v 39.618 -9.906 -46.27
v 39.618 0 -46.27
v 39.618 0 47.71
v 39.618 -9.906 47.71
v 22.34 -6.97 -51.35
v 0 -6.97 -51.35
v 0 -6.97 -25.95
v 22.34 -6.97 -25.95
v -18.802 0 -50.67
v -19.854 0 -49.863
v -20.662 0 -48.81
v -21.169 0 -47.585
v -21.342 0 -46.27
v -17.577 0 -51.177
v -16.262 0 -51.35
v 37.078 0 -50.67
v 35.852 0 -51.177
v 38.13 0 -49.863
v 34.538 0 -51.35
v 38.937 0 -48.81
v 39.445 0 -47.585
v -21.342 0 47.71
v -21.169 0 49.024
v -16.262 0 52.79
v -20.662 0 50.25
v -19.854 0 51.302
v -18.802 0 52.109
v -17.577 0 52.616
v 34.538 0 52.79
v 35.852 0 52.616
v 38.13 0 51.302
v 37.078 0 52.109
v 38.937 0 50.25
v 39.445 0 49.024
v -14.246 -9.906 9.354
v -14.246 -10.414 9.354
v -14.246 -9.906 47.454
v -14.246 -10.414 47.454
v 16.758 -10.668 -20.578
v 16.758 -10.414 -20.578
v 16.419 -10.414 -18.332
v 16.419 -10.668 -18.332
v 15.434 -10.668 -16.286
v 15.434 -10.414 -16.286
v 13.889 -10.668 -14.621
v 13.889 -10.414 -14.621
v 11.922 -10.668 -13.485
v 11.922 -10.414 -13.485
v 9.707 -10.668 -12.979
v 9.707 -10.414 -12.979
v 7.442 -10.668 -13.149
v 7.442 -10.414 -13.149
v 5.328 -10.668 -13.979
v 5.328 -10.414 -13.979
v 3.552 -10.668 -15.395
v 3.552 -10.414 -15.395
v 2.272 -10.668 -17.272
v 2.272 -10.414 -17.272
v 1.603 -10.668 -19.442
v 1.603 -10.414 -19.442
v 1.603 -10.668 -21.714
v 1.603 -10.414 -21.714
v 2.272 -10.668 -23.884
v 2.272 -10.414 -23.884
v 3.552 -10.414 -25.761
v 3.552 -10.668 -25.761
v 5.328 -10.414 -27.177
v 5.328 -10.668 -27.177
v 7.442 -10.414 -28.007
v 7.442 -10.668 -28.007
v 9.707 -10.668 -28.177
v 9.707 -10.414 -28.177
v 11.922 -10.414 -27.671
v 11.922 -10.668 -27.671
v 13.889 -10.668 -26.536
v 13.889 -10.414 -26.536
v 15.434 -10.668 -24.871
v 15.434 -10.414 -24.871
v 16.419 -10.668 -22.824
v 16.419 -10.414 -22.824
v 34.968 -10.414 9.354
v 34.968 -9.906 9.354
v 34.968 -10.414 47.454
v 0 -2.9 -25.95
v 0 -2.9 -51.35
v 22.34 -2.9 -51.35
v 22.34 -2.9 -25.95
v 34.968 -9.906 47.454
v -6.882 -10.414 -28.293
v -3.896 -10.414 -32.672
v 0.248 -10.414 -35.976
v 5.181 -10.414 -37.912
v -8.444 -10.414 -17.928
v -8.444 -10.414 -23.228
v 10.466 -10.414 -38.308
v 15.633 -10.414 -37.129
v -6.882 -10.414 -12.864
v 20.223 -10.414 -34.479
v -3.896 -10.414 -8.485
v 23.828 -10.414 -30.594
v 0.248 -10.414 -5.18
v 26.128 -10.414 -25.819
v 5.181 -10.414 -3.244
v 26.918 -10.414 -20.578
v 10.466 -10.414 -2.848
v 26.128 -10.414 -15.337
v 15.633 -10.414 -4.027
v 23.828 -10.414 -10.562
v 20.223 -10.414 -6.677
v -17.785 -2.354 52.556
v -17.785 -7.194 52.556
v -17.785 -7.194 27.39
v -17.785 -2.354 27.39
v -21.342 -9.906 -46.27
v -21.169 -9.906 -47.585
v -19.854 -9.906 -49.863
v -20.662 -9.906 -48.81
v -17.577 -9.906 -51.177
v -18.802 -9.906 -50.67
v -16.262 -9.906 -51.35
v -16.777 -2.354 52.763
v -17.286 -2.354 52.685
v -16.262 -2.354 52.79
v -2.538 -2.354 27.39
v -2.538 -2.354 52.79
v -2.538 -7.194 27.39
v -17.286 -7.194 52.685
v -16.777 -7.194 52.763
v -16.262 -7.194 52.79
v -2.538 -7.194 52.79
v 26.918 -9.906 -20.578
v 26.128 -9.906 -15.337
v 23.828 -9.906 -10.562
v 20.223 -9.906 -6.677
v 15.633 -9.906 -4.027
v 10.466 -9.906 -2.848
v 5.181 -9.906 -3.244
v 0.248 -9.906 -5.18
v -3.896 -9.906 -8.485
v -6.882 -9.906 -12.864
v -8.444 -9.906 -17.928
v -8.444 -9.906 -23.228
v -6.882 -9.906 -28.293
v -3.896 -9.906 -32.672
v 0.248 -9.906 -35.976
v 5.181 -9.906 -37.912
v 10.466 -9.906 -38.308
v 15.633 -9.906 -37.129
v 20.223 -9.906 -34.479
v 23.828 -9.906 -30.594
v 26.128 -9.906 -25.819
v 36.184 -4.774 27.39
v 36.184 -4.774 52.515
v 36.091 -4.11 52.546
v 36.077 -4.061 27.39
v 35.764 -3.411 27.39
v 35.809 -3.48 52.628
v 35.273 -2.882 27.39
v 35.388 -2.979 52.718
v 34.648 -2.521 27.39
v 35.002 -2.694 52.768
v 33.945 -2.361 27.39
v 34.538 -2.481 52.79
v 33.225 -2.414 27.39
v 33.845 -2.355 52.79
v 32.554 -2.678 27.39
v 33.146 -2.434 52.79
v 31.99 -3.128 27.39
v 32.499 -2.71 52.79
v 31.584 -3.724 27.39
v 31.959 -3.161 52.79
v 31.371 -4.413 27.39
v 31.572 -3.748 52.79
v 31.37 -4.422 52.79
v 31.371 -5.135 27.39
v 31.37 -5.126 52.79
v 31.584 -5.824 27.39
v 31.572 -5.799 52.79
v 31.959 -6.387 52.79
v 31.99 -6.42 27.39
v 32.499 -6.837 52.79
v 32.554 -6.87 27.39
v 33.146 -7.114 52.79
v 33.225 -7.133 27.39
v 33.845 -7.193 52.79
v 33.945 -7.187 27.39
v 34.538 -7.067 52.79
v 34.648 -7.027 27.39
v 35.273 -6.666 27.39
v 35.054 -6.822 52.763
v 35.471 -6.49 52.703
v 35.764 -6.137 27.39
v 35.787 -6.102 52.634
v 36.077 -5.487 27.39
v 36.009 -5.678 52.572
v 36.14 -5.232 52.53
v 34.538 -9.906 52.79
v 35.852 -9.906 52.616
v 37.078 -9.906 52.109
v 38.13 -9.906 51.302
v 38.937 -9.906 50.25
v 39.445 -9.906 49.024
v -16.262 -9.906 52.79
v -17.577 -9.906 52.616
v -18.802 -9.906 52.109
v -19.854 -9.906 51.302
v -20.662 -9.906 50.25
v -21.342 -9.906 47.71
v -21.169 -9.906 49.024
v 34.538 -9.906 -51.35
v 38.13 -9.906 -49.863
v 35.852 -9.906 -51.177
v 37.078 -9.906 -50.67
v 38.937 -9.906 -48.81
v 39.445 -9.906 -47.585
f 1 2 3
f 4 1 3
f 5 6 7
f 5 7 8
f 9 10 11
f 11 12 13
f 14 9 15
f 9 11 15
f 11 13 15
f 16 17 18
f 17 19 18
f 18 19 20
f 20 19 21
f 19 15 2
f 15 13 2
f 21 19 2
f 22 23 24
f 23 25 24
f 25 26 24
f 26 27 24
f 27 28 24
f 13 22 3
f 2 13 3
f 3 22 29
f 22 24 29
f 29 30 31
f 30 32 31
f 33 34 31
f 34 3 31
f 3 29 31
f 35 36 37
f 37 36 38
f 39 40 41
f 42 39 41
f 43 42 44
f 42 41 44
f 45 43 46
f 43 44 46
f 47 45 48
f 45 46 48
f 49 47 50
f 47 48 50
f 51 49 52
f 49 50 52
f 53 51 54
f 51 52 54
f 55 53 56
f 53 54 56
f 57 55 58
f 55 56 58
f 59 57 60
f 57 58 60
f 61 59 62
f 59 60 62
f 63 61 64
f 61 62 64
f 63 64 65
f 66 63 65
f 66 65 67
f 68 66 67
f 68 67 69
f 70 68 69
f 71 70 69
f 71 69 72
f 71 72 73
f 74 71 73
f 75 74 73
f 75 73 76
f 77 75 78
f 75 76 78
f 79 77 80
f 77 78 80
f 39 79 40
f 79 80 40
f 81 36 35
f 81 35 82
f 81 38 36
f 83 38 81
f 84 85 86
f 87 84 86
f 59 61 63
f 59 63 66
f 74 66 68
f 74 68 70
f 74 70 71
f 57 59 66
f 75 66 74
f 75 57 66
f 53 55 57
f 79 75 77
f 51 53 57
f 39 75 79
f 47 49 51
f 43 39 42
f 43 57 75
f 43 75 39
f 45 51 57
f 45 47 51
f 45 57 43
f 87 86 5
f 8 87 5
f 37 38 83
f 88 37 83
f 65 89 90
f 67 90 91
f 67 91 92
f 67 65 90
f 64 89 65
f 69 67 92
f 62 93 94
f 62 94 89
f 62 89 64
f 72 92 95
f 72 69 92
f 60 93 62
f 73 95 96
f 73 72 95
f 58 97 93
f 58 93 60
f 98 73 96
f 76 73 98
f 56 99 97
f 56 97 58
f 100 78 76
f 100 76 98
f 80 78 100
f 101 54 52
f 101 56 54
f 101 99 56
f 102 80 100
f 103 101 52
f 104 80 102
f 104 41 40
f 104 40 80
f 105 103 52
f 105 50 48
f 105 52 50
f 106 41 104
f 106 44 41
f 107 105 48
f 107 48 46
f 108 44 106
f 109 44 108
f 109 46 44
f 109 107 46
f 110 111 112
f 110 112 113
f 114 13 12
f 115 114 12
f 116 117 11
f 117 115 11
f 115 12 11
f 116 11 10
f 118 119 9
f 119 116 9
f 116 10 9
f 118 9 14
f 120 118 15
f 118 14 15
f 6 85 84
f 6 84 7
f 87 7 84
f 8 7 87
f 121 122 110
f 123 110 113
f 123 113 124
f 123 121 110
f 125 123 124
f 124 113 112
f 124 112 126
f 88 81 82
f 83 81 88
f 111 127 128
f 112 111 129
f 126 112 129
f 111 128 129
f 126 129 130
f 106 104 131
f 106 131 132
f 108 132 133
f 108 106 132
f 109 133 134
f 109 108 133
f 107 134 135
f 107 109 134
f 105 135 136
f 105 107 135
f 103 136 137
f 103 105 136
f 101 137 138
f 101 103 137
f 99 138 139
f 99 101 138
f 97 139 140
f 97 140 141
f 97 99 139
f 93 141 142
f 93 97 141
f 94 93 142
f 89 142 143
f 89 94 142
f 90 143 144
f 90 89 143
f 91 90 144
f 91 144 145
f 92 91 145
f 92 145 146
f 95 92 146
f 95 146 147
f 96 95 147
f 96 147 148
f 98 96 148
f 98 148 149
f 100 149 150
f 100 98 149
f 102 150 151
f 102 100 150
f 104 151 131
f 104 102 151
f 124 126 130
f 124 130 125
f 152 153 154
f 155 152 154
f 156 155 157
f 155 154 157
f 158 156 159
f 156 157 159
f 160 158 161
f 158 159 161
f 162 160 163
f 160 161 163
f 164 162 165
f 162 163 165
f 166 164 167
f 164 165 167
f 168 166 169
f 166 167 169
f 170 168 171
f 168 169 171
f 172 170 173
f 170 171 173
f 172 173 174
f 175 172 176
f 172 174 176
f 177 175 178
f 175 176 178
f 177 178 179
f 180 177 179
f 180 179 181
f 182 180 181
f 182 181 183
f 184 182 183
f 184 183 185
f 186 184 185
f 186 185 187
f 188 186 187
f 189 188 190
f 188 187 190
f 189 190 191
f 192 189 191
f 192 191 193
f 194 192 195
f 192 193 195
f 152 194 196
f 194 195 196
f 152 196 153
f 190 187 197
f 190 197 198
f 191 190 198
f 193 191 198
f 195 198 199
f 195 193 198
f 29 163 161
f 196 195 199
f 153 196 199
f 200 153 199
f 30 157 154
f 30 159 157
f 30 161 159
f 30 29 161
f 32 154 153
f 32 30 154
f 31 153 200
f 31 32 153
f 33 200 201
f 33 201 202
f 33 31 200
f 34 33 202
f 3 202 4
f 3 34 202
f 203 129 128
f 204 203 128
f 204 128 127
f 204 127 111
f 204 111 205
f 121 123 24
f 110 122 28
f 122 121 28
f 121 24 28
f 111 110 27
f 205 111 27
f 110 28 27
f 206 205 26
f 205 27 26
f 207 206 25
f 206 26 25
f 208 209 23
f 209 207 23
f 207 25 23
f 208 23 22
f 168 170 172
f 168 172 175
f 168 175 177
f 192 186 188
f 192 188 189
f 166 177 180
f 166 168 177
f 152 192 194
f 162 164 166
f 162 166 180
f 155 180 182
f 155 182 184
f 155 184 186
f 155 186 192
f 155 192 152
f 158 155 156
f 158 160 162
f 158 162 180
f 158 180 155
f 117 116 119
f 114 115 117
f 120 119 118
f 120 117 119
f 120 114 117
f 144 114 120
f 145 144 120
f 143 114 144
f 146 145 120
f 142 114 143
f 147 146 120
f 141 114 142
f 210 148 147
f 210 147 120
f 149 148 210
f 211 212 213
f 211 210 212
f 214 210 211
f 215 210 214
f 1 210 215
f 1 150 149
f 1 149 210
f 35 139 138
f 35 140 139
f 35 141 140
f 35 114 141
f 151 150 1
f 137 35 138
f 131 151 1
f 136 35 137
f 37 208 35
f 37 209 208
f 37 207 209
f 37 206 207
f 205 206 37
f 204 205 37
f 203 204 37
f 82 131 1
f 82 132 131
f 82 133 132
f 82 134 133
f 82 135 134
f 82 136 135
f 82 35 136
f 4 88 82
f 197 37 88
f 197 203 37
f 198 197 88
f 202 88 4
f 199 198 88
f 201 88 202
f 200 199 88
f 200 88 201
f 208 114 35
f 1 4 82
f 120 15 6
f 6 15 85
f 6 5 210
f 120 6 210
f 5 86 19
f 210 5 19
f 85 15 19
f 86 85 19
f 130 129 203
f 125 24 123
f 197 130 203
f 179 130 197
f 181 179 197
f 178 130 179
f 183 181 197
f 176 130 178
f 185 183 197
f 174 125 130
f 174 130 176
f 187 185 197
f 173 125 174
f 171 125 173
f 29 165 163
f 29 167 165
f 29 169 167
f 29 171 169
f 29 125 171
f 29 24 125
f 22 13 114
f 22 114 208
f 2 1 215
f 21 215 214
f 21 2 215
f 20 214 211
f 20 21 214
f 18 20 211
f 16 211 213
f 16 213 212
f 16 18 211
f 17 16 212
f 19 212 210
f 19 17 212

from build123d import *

# Parameters (mm, degrees)
F0_W        = 60.96
F0_H        = 104.14
F1_DEPTH    = 10.414
F2_W        = 60.96
F2_H        = 104.14
F2_R        = 17.78
F2_W_2      = 49.2147877812
F2_H_2      = 38.1
F3_DEPTH    = 0.508
F4_R        = 7.62
F5_DEPTH    = 0.254
F6_W        = 15.2469340246
F6_H        = 4.8402966931
F6_R        = 2.4201483466
F7_DEPTH    = 25.4
F8_T1_DEPTH = 35.306
F9_W        = 22.3395526409
F9_H        = 4.0701881517
F10_DEPTH   = 25.4


# Not quite as in the source:
# - a fillet or chamfer that OpenCascade refuses, or shapes differently, is made with other operations: its cross-section is extruded or revolved along the edge and cut away or added


with BuildPart() as f1:
    # F0 (on Front) → F1 (new body)
    with BuildSketch(Plane.XZ):
        with Locations((9.1376345801, 0.7195156068)):
            Rectangle(F0_W, F0_H)
    extrude(amount=F1_DEPTH)

    # F2 (on face) → F3 (cut)
    with BuildSketch(Plane.XZ.offset(10.414)):
        with Locations((9.1376345801, 0.7195156068)):
            Rectangle(F2_W, F2_H)
        with Locations((9.1376345801, -20.5781124532)):
            Circle(F2_R, mode=Mode.SUBTRACT)
        with Locations((10.3610083461, 28.4036870554)):
            Rectangle(F2_W_2, F2_H_2, mode=Mode.SUBTRACT)
    extrude(amount=-F3_DEPTH, mode=Mode.SUBTRACT)

    # F4 (on face) → F5 (join)
    with BuildSketch(Plane.XZ.offset(10.414)):
        with Locations((9.1376345801, -20.5781124532)):
            Circle(F4_R)
    extrude(amount=F5_DEPTH)

    # F6 (on face) → F7 (cut)
    with BuildSketch(Plane.XY.offset(52.7895156068)):
        with Locations((-10.1616705069, -4.773916211)):
            Rectangle(F6_W, F6_H)
        with Locations((33.7640233338, -4.773916211)):
            Circle(F6_R)
    extrude(amount=-F7_DEPTH, mode=Mode.SUBTRACT)

    # F8: fillet of radius 5.08 on 4 edges, made by hand

    # F8_s2 → F8_t1 (cut)
    with BuildSketch(Plane.XZ.offset(-12.7)):
        with BuildLine():
            ThreePointArc((39.6176345801, -46.2704843932), (38.1297370286, -49.8625868417), (34.5376345801, -51.3504843932))
            Line((34.5376345801, -51.3504843932), (39.6176345801, -51.3504843932))
            Line((39.6176345801, -51.3504843932), (39.6176345801, -46.2704843932))
        make_face()
        with BuildLine():
            ThreePointArc((-21.3423654199, -46.2704843932), (-19.8544678683, -49.8625868417), (-16.2623654199, -51.3504843932))
            Line((-16.2623654199, -51.3504843932), (-21.3423654199, -51.3504843932))
            Line((-21.3423654199, -51.3504843932), (-21.3423654199, -46.2704843932))
        make_face()
        with BuildLine():
            ThreePointArc((-16.2623654199, 52.7895156068), (-19.8544678683, 51.3016180552), (-21.3423654199, 47.7095156068))
            Line((-21.3423654199, 47.7095156068), (-21.3423654199, 52.7895156068))
            Line((-21.3423654199, 52.7895156068), (-16.2623654199, 52.7895156068))
        make_face()
        with BuildLine():
            ThreePointArc((34.5376345801, 52.7895156068), (38.1297370286, 51.3016180552), (39.6176345801, 47.7095156068))
            Line((39.6176345801, 47.7095156068), (39.6176345801, 52.7895156068))
            Line((39.6176345801, 52.7895156068), (34.5376345801, 52.7895156068))
        make_face()
    extrude(amount=F8_T1_DEPTH, mode=Mode.SUBTRACT)

    # F9 (on face) → F10 (cut)
    with BuildSketch(Plane(origin=(0, 0, -51.3504843932), x_dir=(1, 0, 0), z_dir=(0, 0, -1))):
        with Locations((11.1697763205, 4.9349990441)):
            Rectangle(F9_W, F9_H)
    extrude(amount=-F10_DEPTH, mode=Mode.SUBTRACT)


solid = f1.part
